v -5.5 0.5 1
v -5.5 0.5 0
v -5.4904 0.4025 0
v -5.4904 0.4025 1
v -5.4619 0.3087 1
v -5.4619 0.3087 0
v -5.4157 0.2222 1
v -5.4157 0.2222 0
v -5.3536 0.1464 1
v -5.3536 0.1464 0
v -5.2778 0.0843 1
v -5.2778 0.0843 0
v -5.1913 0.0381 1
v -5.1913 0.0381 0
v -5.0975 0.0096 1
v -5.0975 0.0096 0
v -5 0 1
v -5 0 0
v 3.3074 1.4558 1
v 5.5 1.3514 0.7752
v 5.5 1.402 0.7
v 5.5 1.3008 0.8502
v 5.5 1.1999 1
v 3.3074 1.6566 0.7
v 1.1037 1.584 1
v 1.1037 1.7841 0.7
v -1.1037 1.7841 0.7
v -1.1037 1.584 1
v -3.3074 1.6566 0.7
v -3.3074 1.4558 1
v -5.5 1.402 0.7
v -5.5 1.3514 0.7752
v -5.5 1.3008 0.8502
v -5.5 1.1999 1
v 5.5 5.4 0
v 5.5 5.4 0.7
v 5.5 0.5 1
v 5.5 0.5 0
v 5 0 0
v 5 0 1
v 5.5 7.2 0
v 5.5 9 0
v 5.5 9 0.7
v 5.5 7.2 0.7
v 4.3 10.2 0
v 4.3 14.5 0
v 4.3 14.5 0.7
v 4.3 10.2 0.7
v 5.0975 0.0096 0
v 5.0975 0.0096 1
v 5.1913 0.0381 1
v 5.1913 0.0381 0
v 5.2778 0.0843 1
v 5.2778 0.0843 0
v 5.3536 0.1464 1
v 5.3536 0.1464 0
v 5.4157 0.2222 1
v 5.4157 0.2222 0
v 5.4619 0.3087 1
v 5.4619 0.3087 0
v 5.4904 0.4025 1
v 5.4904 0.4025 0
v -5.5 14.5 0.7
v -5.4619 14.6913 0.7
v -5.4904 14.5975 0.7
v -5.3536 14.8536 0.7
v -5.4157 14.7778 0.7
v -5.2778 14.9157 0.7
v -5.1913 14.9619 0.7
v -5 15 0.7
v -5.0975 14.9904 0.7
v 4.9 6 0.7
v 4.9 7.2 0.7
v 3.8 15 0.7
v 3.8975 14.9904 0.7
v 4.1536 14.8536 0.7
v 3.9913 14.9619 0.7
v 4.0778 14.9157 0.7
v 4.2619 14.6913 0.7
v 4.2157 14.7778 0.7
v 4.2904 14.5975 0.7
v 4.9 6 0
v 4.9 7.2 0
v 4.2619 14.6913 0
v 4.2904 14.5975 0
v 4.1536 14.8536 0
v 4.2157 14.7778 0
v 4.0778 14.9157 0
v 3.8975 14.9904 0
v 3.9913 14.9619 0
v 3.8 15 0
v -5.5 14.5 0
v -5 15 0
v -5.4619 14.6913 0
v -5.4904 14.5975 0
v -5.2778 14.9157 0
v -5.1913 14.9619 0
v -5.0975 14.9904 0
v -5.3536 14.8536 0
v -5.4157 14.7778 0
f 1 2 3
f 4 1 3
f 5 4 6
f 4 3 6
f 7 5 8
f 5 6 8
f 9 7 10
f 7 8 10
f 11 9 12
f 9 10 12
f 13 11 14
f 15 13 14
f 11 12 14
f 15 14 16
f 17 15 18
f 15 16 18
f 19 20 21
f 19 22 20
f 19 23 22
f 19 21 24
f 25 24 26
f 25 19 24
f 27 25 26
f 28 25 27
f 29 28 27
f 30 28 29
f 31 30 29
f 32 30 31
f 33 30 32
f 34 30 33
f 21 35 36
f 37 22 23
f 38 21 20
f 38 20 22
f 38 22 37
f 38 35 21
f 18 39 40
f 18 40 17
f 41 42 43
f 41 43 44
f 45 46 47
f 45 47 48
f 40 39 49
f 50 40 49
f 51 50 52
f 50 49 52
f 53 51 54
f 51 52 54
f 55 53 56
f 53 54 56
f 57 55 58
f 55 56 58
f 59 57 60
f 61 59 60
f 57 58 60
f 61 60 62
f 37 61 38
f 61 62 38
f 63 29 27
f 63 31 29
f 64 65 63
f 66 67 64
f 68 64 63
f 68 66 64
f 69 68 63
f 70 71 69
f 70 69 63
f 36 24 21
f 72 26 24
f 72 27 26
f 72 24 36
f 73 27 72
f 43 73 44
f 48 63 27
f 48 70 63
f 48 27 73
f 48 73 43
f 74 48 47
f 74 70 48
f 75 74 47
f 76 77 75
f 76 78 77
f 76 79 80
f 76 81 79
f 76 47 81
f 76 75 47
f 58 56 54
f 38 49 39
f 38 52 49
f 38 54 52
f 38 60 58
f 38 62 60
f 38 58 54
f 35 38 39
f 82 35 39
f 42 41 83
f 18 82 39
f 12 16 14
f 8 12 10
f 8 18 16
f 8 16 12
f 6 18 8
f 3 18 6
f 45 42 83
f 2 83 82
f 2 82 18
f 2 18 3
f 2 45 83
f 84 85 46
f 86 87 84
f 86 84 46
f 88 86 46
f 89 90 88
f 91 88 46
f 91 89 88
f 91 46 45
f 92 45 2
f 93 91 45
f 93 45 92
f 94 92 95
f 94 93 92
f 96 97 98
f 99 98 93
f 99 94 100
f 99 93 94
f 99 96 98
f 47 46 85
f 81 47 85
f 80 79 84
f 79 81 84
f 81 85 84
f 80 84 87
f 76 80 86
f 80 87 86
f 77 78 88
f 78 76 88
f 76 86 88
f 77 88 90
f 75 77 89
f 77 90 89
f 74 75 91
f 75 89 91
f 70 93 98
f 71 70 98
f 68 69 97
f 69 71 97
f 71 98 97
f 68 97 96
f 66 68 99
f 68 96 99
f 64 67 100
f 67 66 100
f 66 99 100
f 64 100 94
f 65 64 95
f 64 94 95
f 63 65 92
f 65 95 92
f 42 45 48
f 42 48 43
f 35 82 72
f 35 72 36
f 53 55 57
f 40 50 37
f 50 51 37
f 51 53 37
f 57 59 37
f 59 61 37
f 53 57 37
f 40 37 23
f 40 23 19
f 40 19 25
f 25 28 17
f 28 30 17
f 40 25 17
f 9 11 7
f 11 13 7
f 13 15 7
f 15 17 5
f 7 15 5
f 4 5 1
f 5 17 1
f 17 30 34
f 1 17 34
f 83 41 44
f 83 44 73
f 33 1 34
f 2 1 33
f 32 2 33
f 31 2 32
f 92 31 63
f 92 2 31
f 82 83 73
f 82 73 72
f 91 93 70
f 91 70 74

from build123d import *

# Parameters (mm, degrees)
BOX072_W         = 11
BOX072_H         = 15
BOX072_DEPTH     = 0.3
EXTRUDE017_DEPTH = 1


with BuildPart() as cone:
    # Cone → Cone (revolve)
    with BuildSketch(Plane(origin=(0, -36.4, 0.7), x_dir=(1, 0, 0), z_dir=(0, -1, 0))):
        Polygon((0, 0), (38.2, 0), (38, 0.3), (0, 0.3), align=None)
    revolve(axis=Axis((0, -36.4, 0.7), (0, 0, 1)))


with BuildPart() as cut018:
    # Box072 → Box072 (new body)
    with BuildSketch(Plane(origin=(-5.5, 0, 0.7), x_dir=(1, 0, 0), z_dir=(0, 0, 1))):
        with Locations((5.5, 7.5)):
            Rectangle(BOX072_W, BOX072_H)
    extrude(amount=BOX072_DEPTH)

    # Cut018: cut Cone
    add(cone.part, mode=Mode.SUBTRACT)


with BuildPart() as body:
    # Sketch018 → Extrude017 (new body)
    with BuildSketch(Plane.XY):
        with BuildLine():
            Line((-5.5, 0.5), (-5.5, 14.5))
            ThreePointArc((-5, 15), (-5.353553, 14.853553), (-5.5, 14.5))
            Line((-5, 15), (3.8, 15))
            ThreePointArc((4.3, 14.5), (4.153553, 14.853553), (3.8, 15))
            Line((4.3, 14.5), (4.3, 10.2))
            Line((4.3, 10.2), (5.5, 9))
            Line((5.5, 9), (5.5, 7.2))
            Line((5.5, 7.2), (4.9, 7.2))
            Line((4.9, 7.2), (4.9, 6))
            Line((4.9, 6), (5.5, 5.4))
            Line((5.5, 5.4), (5.5, 0.5))
            ThreePointArc((5, 0), (5.353553, 0.146447), (5.5, 0.5))
            Line((5, 0), (-5, 0))
            ThreePointArc((-5.5, 0.5), (-5.353553, 0.146447), (-5, 0))
        make_face()
    extrude(amount=EXTRUDE017_DEPTH)

    # Cut019: cut Cut018
    add(cut018.part, mode=Mode.SUBTRACT)


solid = body.part
